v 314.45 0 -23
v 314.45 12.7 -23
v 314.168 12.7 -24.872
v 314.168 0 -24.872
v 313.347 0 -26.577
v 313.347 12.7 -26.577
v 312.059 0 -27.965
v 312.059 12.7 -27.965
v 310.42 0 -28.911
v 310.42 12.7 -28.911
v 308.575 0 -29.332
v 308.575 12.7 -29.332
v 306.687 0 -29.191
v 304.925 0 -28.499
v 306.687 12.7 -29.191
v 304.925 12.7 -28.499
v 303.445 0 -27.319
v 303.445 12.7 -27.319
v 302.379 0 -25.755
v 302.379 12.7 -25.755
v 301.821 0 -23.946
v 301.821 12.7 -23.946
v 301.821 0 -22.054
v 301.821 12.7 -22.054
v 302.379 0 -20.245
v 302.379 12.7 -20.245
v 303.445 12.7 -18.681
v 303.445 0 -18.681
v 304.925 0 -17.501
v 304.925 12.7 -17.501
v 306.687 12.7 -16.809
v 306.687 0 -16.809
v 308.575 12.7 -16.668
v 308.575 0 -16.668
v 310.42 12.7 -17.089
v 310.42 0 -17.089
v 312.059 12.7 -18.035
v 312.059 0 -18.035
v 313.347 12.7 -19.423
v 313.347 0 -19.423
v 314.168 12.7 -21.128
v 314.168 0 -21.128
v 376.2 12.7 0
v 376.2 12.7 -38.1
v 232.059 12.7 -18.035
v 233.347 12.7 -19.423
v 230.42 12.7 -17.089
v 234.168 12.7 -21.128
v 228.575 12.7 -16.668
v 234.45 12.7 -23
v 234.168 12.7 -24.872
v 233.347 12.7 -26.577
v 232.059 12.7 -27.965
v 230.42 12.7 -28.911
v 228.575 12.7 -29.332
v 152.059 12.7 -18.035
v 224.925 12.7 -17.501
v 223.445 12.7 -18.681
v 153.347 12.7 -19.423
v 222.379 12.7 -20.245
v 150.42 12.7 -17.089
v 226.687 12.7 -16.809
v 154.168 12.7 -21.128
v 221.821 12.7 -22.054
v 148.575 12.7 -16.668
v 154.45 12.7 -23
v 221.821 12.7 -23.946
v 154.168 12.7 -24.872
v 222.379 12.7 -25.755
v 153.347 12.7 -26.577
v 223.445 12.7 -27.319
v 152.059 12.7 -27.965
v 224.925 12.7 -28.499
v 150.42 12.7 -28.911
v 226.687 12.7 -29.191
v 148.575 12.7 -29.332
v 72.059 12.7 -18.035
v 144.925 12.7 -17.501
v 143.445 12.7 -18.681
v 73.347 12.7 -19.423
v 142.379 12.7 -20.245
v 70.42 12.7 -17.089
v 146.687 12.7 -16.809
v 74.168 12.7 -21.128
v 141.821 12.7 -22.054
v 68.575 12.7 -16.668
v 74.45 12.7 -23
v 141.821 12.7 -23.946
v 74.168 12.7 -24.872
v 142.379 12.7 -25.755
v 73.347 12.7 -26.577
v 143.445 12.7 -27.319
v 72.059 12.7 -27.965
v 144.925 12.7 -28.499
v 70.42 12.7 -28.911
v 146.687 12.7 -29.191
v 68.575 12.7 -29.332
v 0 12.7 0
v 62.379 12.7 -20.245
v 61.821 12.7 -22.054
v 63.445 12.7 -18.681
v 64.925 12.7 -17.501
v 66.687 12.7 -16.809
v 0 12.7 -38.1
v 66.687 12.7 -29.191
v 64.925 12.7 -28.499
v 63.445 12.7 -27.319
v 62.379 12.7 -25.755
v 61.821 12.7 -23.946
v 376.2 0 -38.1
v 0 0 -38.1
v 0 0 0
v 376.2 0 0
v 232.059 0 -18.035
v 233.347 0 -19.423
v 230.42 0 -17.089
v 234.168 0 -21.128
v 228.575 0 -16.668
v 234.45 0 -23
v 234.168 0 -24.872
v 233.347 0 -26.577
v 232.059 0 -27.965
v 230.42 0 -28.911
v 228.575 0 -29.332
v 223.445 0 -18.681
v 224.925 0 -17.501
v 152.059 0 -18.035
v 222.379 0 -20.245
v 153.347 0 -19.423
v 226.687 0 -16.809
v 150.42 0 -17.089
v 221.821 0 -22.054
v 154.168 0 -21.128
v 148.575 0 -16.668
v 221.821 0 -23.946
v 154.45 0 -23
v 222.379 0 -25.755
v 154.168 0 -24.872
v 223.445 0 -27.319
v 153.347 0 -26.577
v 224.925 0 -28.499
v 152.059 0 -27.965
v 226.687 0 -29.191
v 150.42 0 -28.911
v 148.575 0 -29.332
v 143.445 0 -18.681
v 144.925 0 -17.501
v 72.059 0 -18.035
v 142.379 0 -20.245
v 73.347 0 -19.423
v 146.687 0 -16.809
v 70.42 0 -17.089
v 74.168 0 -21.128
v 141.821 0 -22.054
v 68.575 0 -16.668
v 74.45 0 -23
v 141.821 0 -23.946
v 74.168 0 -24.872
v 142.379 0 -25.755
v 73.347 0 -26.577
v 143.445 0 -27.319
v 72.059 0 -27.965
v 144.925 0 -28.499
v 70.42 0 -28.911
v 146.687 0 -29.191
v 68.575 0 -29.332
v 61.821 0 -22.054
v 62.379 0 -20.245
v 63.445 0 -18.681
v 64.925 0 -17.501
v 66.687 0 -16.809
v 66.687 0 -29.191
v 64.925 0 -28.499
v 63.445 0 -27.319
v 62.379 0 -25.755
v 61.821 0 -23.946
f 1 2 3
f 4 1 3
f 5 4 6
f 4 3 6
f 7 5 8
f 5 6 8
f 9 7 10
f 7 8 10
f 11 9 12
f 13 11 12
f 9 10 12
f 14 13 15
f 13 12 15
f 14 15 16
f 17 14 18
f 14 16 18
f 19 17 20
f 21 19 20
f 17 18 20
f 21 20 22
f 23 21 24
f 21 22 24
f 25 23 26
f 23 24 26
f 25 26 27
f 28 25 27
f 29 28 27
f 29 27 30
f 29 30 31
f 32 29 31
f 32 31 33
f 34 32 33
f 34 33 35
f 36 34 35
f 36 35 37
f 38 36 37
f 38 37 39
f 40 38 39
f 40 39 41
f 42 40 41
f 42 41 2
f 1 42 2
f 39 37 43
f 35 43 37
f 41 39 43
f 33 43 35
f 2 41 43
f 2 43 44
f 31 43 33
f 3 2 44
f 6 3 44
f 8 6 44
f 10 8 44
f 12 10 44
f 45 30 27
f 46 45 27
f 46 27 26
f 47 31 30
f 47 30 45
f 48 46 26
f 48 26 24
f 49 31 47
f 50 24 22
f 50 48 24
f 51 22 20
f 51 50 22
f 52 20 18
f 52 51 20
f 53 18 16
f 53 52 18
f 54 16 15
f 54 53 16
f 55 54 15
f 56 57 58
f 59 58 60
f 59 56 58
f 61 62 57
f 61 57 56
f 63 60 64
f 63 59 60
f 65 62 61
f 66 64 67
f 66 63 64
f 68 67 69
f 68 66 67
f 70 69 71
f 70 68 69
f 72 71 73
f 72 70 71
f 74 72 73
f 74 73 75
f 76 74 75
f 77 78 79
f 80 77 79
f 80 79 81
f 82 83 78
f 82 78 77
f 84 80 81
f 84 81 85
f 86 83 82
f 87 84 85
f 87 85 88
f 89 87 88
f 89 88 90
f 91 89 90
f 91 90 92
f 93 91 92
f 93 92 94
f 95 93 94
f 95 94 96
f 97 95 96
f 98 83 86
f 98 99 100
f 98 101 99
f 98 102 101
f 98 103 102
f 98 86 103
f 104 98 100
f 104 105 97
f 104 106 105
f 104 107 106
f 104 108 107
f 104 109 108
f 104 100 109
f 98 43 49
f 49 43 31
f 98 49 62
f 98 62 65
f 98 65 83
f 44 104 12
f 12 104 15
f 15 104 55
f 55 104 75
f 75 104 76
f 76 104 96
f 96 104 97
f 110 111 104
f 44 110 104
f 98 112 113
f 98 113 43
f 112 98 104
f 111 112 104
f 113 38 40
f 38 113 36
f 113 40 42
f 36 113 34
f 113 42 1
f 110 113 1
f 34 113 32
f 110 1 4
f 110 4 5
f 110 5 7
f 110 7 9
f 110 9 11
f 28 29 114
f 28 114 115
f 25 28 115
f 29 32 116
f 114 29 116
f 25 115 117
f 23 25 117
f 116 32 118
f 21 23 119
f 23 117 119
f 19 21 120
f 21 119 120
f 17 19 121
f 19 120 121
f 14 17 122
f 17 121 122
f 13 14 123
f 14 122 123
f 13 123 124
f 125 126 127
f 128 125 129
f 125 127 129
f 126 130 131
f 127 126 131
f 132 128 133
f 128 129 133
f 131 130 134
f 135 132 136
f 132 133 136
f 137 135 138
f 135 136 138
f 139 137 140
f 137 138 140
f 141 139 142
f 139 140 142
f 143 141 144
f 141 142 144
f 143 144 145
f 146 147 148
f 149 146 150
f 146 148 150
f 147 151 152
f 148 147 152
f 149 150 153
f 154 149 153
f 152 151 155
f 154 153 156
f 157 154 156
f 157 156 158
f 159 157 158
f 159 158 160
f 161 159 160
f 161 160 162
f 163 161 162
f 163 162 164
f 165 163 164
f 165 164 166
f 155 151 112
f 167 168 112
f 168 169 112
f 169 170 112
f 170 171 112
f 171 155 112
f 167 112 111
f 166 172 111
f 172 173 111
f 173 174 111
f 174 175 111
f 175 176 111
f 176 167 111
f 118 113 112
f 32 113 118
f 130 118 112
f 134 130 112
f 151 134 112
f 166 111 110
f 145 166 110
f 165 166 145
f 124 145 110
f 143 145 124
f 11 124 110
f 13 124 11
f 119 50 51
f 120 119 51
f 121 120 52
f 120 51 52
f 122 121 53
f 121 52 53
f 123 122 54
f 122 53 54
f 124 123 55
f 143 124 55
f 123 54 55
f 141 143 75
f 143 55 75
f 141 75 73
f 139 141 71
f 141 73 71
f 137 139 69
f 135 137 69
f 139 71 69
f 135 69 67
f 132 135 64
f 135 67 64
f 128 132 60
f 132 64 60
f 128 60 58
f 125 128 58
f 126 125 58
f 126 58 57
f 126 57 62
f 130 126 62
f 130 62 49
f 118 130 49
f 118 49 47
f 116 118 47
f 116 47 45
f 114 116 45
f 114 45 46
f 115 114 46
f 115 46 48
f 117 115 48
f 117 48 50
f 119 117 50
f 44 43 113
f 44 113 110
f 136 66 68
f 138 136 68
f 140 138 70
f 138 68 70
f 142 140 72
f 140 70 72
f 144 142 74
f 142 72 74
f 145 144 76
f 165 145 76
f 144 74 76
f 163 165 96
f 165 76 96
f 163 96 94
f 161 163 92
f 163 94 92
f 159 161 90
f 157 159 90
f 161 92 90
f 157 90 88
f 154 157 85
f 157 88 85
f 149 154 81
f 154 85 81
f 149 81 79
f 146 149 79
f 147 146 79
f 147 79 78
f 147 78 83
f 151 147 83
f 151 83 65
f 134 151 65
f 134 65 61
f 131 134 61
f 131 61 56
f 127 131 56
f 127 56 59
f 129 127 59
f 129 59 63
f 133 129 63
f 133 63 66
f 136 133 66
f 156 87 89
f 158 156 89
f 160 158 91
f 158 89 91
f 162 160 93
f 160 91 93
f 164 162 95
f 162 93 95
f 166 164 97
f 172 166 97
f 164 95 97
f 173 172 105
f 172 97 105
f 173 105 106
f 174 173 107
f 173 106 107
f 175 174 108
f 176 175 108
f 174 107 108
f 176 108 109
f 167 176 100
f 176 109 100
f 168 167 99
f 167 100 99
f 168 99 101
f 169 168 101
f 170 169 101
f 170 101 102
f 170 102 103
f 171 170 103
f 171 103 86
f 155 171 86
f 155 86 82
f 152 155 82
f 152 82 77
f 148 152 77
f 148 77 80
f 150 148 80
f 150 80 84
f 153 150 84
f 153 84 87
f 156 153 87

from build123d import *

# Parameters (mm, degrees)
SKETCH1_W               = 38.1
SKETCH1_H               = 12.7
BOSS_EXTRUDE1_DEPTH     = 376.2
SKETCH2_R               = 6.35
CUT_EXTRUDE1_DEPTH      = 1
CUT_EXTRUDE1_DEPTH_BACK = 13.7


with BuildPart() as part:
    # Sketch1 → Boss-Extrude1 (new body)
    with BuildSketch(Plane(origin=(0, 0, 0), x_dir=(0, 0, -1), z_dir=(1, 0, 0))):
        with Locations((19.05, 6.35)):
            Rectangle(SKETCH1_W, SKETCH1_H)
    extrude(amount=BOSS_EXTRUDE1_DEPTH)

    # Sketch2 → Cut-Extrude1 (cut, two sides)
    with BuildSketch(Plane(origin=(0, 12.7, 0), x_dir=(1, 0, 0), z_dir=(0, 1, 0))) as cut_extrude1_sk:
        with Locations((308.1, 23)):
            Circle(SKETCH2_R)
        with Locations((228.1, 23)):
            Circle(SKETCH2_R)
        with Locations((148.1, 23)):
            Circle(SKETCH2_R)
        with Locations((68.1, 23)):
            Circle(SKETCH2_R)
    extrude(amount=CUT_EXTRUDE1_DEPTH, mode=Mode.SUBTRACT)
    extrude(cut_extrude1_sk.sketch, amount=-CUT_EXTRUDE1_DEPTH_BACK, mode=Mode.SUBTRACT)


solid = part.part
